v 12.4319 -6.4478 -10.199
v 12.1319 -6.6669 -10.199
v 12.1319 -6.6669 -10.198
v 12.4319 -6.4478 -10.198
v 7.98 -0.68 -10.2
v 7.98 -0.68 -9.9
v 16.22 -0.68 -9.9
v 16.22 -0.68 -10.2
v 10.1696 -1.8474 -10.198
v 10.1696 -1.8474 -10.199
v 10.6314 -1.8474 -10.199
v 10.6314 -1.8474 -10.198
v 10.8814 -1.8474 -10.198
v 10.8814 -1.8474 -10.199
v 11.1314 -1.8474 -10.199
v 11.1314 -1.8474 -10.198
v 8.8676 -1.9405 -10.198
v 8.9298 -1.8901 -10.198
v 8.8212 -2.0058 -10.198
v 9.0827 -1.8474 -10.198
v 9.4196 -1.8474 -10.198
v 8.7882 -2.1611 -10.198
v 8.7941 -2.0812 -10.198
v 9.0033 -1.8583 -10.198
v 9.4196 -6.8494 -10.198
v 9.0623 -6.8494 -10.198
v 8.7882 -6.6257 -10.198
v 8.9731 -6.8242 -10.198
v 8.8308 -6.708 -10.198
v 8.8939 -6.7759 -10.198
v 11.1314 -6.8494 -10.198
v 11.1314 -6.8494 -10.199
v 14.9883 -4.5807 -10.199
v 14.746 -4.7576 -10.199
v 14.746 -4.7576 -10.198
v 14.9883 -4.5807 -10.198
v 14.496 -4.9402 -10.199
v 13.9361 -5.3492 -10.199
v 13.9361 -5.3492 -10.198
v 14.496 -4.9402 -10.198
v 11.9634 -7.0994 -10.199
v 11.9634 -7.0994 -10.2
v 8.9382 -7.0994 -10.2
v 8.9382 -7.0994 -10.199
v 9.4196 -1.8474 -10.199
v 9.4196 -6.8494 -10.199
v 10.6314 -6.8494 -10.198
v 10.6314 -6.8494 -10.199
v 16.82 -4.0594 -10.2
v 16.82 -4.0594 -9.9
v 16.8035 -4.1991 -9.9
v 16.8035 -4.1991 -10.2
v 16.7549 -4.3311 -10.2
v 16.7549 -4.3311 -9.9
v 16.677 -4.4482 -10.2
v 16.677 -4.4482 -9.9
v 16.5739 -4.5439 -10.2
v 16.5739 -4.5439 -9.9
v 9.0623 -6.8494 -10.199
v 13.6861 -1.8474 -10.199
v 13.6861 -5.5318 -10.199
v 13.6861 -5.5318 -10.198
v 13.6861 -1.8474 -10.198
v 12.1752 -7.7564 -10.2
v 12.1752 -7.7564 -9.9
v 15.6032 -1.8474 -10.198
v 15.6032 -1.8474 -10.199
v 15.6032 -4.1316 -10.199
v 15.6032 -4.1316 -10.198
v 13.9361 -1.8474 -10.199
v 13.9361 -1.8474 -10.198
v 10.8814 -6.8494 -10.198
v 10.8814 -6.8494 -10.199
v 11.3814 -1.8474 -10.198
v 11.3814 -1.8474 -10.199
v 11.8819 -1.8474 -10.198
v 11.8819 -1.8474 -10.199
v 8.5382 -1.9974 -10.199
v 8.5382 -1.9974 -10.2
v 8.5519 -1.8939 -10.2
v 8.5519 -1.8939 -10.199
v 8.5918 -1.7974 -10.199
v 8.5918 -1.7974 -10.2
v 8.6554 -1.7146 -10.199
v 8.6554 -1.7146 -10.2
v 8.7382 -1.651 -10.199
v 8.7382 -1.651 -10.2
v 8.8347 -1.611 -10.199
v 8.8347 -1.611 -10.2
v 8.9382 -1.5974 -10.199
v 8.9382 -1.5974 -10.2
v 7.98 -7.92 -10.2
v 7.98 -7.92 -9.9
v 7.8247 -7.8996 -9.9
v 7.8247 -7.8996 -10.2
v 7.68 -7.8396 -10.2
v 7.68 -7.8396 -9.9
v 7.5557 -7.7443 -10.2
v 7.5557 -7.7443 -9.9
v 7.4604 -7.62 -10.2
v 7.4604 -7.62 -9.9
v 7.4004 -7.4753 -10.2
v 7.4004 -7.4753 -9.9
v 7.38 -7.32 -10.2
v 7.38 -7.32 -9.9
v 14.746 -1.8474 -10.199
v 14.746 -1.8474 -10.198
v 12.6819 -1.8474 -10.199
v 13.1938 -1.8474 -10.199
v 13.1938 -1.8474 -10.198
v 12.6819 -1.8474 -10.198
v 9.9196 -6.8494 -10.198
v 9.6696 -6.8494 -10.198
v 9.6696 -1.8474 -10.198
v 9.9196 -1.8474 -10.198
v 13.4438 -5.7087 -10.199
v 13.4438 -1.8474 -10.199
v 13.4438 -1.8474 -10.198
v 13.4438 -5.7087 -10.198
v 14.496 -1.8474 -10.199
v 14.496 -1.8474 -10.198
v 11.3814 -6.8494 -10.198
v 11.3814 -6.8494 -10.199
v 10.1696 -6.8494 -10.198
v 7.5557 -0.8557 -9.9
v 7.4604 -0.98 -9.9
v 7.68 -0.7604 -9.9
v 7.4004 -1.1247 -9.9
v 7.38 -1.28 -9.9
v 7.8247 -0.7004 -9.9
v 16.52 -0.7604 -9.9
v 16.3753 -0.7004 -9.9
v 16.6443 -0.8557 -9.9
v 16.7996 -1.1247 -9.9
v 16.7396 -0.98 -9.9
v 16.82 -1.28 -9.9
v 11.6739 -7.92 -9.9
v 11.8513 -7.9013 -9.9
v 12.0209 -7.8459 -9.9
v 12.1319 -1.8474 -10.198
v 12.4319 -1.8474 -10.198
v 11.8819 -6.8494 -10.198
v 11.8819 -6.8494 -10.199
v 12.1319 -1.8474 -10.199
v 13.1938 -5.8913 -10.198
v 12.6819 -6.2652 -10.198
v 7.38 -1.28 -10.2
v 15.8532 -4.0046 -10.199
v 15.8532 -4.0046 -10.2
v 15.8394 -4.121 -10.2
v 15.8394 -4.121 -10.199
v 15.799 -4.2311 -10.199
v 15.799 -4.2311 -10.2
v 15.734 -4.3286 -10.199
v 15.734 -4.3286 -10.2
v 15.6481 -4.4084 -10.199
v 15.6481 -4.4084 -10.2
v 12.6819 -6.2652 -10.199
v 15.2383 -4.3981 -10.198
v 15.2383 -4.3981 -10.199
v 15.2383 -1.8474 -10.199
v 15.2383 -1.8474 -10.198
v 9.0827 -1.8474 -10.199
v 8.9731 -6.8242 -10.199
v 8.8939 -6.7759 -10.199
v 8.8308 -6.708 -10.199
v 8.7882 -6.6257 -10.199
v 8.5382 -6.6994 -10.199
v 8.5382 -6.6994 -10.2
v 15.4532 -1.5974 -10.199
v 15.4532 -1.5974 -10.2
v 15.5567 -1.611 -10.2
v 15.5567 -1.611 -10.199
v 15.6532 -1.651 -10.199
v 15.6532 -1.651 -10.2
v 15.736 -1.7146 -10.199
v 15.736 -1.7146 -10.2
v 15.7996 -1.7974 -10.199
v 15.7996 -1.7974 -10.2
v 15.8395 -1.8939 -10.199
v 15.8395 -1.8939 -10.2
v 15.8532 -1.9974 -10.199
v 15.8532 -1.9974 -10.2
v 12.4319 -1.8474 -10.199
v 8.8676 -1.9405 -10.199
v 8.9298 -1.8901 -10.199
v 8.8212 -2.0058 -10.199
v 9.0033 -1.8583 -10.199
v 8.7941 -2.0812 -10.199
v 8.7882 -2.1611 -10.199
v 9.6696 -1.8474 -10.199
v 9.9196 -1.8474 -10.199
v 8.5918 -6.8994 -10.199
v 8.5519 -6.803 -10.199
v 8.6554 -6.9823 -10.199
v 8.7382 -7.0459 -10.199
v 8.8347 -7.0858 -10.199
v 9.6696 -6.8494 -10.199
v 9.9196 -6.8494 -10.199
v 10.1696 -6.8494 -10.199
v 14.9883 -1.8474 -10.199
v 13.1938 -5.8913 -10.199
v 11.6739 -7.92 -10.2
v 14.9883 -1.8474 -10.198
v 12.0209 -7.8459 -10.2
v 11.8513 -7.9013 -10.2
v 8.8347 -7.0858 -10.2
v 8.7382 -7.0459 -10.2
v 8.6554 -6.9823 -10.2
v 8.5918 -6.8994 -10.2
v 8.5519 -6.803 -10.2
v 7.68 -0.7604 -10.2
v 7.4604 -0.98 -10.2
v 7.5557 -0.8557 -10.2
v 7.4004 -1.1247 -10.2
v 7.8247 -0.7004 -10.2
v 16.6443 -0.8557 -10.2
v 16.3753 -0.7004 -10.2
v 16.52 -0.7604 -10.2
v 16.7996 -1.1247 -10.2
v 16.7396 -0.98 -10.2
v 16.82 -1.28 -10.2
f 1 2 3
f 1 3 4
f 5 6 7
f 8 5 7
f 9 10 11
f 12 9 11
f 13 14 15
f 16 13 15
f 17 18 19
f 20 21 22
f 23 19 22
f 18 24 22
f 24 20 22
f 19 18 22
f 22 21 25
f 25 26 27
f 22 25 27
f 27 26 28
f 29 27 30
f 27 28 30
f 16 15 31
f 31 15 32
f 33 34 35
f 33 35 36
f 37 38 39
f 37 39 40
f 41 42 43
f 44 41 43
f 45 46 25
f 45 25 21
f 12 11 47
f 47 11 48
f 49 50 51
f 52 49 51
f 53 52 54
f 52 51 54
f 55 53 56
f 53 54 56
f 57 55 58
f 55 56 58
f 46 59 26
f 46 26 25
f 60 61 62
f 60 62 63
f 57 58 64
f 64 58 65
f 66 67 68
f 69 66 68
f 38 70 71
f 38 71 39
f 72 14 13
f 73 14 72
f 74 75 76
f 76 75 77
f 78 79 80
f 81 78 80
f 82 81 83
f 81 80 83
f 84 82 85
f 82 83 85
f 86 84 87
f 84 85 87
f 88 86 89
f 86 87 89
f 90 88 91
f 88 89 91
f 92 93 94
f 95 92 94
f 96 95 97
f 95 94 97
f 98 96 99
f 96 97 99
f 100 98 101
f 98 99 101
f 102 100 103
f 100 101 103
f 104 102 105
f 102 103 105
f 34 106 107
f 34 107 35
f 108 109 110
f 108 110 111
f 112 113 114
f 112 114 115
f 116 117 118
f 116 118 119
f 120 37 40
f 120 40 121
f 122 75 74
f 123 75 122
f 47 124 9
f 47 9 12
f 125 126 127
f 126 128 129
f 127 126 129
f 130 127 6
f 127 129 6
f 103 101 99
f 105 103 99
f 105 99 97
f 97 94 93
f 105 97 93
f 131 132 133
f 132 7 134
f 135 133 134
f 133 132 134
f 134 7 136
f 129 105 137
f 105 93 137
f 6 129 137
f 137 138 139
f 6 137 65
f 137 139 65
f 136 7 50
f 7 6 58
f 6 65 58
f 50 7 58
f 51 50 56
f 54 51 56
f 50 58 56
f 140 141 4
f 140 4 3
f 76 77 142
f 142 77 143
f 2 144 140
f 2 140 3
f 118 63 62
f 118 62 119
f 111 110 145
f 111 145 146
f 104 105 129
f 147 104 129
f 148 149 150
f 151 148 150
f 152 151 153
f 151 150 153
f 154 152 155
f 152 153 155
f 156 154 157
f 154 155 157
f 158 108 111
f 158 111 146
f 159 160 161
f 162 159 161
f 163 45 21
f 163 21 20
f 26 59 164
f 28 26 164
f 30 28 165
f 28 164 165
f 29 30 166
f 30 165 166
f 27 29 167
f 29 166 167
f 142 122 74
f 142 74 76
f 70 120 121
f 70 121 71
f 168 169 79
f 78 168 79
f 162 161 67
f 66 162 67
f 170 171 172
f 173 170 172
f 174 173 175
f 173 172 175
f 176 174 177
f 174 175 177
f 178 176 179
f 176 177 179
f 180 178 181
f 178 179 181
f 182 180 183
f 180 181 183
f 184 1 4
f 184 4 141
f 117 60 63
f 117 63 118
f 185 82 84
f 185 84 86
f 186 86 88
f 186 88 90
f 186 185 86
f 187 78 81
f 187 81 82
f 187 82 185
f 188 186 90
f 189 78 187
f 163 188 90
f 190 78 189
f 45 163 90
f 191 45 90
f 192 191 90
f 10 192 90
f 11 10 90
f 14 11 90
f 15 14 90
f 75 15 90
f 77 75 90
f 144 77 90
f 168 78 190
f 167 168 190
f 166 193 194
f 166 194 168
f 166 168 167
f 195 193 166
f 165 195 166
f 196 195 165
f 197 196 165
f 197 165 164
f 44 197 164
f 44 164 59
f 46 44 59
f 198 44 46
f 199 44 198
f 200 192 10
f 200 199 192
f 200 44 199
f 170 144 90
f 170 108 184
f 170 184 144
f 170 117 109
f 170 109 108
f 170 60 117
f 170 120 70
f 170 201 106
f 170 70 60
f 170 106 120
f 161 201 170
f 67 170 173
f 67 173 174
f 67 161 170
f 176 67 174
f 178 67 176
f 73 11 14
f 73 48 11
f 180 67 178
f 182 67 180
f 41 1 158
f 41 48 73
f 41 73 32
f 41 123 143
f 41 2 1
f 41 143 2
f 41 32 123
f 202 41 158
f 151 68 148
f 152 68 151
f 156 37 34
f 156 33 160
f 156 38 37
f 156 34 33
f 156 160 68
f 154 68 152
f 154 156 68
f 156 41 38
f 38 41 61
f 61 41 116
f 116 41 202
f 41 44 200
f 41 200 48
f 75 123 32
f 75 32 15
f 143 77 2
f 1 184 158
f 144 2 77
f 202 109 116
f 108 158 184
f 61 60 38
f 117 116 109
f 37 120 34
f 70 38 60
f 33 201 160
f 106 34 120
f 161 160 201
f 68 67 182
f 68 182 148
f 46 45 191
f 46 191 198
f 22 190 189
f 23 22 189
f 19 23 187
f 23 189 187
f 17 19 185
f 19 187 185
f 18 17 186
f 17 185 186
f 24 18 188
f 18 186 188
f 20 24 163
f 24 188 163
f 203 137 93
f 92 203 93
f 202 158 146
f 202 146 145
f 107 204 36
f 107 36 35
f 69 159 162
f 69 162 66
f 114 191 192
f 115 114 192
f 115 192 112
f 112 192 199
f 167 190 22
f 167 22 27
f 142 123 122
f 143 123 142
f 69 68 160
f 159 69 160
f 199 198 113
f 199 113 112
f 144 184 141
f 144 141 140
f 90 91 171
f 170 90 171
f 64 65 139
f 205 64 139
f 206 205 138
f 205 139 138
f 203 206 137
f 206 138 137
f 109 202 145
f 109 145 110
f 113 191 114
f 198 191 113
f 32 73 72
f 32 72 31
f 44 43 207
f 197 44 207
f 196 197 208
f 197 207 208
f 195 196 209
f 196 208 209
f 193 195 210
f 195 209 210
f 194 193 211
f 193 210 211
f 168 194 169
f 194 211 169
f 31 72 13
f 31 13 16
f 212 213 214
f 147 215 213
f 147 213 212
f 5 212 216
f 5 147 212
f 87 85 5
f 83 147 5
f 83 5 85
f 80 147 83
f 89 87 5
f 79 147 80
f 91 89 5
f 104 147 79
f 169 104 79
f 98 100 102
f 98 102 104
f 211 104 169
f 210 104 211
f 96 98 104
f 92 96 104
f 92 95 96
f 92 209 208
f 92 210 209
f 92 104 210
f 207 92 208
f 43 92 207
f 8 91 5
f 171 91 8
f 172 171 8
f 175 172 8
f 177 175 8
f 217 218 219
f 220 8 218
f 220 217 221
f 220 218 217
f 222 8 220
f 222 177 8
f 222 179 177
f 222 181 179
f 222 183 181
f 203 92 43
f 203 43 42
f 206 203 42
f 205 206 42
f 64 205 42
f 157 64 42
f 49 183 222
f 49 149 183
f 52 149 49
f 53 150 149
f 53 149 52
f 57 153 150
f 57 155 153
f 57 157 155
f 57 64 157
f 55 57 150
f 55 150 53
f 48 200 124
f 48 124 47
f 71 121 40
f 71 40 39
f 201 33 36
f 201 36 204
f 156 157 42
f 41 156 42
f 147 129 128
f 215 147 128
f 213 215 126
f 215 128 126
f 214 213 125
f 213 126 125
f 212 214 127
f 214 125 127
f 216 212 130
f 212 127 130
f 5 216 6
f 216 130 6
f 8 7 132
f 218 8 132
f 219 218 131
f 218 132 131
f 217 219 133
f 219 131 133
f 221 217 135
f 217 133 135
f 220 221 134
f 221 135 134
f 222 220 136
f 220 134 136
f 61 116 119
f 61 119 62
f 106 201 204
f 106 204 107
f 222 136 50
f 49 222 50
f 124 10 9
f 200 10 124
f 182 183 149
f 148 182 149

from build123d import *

# Parameters (mm, degrees)
PAD006_DEPTH    = 0.3
POCKET015_DEPTH = 0.001
SKETCH023_W     = 0.500416358
SKETCH023_H     = 5.002047251
SKETCH023_W_2   = 0.25
SKETCH023_W_3   = 0.461841
POCKET016_DEPTH = 0.001


with BuildPart() as part:
    # Sketch021 (on Face1 of Binder006) → Pad006 (new body)
    with BuildSketch(Plane(origin=(0, 0, -9.9), x_dir=(1, 0, 0), z_dir=(0, 0, -1))):
        with BuildLine():
            Line((7.38, 7.32), (7.38, 1.28))
            ThreePointArc((7.38, 1.28), (7.5557359313, 0.8557359313), (7.98, 0.68))
            Line((7.98, 0.68), (16.22, 0.68))
            ThreePointArc((16.22, 0.68), (16.6442640687, 0.8557359313), (16.82, 1.28))
            Line((16.82, 1.28), (16.82, 4.0593629773))
            ThreePointArc((16.82, 4.0593629773), (16.7549416454, 4.3310934246), (16.5738752133, 4.543896086))
            Line((16.5738752133, 4.543896086), (12.1752198046, 7.7564219039))
            ThreePointArc((12.1752198046, 7.7564219039), (11.9375643517, 7.8780713515), (11.6738965857, 7.92))
            Line((11.6738965857, 7.92), (7.98, 7.92))
            ThreePointArc((7.98, 7.92), (7.5557359313, 7.7442640687), (7.38, 7.32))
        make_face()
    extrude(amount=PAD006_DEPTH)

    # Sketch022 (on Face12 of Pad006) → Pocket015 (cut)
    with BuildSketch(Plane(origin=(0, 0, -10.2), x_dir=(1, 0, 0), z_dir=(0, 0, -1))):
        with BuildLine():
            Line((8.5382272485, 6.6994467778), (8.5382272485, 1.9973995268))
            ThreePointArc((8.5382272485, 1.9973995268), (8.655384536, 1.7145568143), (8.9382272485, 1.5973995268))
            Line((8.9382272485, 1.5973995268), (15.4531796461, 1.5973995268))
            ThreePointArc((15.4531796461, 1.5973995268), (15.7360223586, 1.7145568143), (15.8531796461, 1.9973995268))
            Line((15.8531796461, 1.9973995268), (15.8531796461, 4.0046213992))
            ThreePointArc((15.8531796461, 4.0046213992), (15.7989643506, 4.2310634386), (15.6480756572, 4.4083989897))
            Line((15.6480756572, 4.4083989897), (11.9634385277, 7.0994467778))
            Line((11.9634385277, 7.0994467778), (8.9382272485, 7.0994467778))
            ThreePointArc((8.9382272485, 7.0994467778), (8.655384536, 6.9822894903), (8.5382272485, 6.6994467778))
        make_face()
    extrude(amount=-POCKET015_DEPTH, mode=Mode.SUBTRACT)

    # Sketch023 (on Face22 of Pocket015) → Pocket016 (cut)
    with BuildSketch(Plane(origin=(0, 0, -10.199), x_dir=(1, 0, 0), z_dir=(0, 0, -1))):
        Polygon((15.2382783773, 4.3981150688), (15.2382783773, 1.8473995268), (15.6031796461, 1.8473995268), (15.6031796461, 4.1316120951), align=None)
        Polygon((14.9882783773, 4.580700741), (14.9882783773, 1.8473995268), (14.746011823, 1.8473995268), (14.746011823, 4.7576383477), align=None)
        Polygon((14.496011823, 4.9402240199), (14.496011823, 1.8473995268), (13.9360564118, 1.8473995268), (13.9360564118, 5.3491833605), align=None)
        Polygon((13.6860564118, 5.5317690326), (13.6860564118, 1.8473995268), (13.4437898574, 1.8473995268), (13.4437898574, 5.7087066393), align=None)
        Polygon((13.1937898574, 5.8912923115), (13.1937898574, 1.8473995268), (12.681865358, 1.8473995268), (12.681865358, 6.2651726269), align=None)
        Polygon((12.431865358, 6.447758299), (12.431865358, 1.8473995268), (12.131865358, 1.8473995268), (12.131865358, 6.6668611056), align=None)
        with Locations((11.631657179, 4.3484231523)):
            Rectangle(SKETCH023_W, SKETCH023_H)
        with Locations((11.006449, 4.3484231523)):
            Rectangle(SKETCH023_W_2, SKETCH023_H)
        with Locations((10.4005285, 4.3484231523)):
            Rectangle(SKETCH023_W_3, SKETCH023_H)
        with Locations((9.794608, 4.3484231523)):
            Rectangle(SKETCH023_W_2, SKETCH023_H)
        with BuildLine():
            Line((9.419608, 6.8494467778), (9.419608, 1.8473995268))
            Line((9.419608, 1.8473995268), (9.08269333, 1.8473995268))
            ThreePointArc((8.7882272485, 2.161070185), (8.8675882445, 1.9405182967), (9.08269333, 1.8473995268))
            Line((8.7882272485, 2.161070185), (8.7882272485, 6.625654773))
            ThreePointArc((9.0623132914, 6.8494467778), (8.893948417, 6.7759117649), (8.7882272485, 6.625654773))
            Line((9.0623132914, 6.8494467778), (9.419608, 6.8494467778))
        make_face()
    extrude(amount=-POCKET016_DEPTH, mode=Mode.SUBTRACT)


solid = part.part
